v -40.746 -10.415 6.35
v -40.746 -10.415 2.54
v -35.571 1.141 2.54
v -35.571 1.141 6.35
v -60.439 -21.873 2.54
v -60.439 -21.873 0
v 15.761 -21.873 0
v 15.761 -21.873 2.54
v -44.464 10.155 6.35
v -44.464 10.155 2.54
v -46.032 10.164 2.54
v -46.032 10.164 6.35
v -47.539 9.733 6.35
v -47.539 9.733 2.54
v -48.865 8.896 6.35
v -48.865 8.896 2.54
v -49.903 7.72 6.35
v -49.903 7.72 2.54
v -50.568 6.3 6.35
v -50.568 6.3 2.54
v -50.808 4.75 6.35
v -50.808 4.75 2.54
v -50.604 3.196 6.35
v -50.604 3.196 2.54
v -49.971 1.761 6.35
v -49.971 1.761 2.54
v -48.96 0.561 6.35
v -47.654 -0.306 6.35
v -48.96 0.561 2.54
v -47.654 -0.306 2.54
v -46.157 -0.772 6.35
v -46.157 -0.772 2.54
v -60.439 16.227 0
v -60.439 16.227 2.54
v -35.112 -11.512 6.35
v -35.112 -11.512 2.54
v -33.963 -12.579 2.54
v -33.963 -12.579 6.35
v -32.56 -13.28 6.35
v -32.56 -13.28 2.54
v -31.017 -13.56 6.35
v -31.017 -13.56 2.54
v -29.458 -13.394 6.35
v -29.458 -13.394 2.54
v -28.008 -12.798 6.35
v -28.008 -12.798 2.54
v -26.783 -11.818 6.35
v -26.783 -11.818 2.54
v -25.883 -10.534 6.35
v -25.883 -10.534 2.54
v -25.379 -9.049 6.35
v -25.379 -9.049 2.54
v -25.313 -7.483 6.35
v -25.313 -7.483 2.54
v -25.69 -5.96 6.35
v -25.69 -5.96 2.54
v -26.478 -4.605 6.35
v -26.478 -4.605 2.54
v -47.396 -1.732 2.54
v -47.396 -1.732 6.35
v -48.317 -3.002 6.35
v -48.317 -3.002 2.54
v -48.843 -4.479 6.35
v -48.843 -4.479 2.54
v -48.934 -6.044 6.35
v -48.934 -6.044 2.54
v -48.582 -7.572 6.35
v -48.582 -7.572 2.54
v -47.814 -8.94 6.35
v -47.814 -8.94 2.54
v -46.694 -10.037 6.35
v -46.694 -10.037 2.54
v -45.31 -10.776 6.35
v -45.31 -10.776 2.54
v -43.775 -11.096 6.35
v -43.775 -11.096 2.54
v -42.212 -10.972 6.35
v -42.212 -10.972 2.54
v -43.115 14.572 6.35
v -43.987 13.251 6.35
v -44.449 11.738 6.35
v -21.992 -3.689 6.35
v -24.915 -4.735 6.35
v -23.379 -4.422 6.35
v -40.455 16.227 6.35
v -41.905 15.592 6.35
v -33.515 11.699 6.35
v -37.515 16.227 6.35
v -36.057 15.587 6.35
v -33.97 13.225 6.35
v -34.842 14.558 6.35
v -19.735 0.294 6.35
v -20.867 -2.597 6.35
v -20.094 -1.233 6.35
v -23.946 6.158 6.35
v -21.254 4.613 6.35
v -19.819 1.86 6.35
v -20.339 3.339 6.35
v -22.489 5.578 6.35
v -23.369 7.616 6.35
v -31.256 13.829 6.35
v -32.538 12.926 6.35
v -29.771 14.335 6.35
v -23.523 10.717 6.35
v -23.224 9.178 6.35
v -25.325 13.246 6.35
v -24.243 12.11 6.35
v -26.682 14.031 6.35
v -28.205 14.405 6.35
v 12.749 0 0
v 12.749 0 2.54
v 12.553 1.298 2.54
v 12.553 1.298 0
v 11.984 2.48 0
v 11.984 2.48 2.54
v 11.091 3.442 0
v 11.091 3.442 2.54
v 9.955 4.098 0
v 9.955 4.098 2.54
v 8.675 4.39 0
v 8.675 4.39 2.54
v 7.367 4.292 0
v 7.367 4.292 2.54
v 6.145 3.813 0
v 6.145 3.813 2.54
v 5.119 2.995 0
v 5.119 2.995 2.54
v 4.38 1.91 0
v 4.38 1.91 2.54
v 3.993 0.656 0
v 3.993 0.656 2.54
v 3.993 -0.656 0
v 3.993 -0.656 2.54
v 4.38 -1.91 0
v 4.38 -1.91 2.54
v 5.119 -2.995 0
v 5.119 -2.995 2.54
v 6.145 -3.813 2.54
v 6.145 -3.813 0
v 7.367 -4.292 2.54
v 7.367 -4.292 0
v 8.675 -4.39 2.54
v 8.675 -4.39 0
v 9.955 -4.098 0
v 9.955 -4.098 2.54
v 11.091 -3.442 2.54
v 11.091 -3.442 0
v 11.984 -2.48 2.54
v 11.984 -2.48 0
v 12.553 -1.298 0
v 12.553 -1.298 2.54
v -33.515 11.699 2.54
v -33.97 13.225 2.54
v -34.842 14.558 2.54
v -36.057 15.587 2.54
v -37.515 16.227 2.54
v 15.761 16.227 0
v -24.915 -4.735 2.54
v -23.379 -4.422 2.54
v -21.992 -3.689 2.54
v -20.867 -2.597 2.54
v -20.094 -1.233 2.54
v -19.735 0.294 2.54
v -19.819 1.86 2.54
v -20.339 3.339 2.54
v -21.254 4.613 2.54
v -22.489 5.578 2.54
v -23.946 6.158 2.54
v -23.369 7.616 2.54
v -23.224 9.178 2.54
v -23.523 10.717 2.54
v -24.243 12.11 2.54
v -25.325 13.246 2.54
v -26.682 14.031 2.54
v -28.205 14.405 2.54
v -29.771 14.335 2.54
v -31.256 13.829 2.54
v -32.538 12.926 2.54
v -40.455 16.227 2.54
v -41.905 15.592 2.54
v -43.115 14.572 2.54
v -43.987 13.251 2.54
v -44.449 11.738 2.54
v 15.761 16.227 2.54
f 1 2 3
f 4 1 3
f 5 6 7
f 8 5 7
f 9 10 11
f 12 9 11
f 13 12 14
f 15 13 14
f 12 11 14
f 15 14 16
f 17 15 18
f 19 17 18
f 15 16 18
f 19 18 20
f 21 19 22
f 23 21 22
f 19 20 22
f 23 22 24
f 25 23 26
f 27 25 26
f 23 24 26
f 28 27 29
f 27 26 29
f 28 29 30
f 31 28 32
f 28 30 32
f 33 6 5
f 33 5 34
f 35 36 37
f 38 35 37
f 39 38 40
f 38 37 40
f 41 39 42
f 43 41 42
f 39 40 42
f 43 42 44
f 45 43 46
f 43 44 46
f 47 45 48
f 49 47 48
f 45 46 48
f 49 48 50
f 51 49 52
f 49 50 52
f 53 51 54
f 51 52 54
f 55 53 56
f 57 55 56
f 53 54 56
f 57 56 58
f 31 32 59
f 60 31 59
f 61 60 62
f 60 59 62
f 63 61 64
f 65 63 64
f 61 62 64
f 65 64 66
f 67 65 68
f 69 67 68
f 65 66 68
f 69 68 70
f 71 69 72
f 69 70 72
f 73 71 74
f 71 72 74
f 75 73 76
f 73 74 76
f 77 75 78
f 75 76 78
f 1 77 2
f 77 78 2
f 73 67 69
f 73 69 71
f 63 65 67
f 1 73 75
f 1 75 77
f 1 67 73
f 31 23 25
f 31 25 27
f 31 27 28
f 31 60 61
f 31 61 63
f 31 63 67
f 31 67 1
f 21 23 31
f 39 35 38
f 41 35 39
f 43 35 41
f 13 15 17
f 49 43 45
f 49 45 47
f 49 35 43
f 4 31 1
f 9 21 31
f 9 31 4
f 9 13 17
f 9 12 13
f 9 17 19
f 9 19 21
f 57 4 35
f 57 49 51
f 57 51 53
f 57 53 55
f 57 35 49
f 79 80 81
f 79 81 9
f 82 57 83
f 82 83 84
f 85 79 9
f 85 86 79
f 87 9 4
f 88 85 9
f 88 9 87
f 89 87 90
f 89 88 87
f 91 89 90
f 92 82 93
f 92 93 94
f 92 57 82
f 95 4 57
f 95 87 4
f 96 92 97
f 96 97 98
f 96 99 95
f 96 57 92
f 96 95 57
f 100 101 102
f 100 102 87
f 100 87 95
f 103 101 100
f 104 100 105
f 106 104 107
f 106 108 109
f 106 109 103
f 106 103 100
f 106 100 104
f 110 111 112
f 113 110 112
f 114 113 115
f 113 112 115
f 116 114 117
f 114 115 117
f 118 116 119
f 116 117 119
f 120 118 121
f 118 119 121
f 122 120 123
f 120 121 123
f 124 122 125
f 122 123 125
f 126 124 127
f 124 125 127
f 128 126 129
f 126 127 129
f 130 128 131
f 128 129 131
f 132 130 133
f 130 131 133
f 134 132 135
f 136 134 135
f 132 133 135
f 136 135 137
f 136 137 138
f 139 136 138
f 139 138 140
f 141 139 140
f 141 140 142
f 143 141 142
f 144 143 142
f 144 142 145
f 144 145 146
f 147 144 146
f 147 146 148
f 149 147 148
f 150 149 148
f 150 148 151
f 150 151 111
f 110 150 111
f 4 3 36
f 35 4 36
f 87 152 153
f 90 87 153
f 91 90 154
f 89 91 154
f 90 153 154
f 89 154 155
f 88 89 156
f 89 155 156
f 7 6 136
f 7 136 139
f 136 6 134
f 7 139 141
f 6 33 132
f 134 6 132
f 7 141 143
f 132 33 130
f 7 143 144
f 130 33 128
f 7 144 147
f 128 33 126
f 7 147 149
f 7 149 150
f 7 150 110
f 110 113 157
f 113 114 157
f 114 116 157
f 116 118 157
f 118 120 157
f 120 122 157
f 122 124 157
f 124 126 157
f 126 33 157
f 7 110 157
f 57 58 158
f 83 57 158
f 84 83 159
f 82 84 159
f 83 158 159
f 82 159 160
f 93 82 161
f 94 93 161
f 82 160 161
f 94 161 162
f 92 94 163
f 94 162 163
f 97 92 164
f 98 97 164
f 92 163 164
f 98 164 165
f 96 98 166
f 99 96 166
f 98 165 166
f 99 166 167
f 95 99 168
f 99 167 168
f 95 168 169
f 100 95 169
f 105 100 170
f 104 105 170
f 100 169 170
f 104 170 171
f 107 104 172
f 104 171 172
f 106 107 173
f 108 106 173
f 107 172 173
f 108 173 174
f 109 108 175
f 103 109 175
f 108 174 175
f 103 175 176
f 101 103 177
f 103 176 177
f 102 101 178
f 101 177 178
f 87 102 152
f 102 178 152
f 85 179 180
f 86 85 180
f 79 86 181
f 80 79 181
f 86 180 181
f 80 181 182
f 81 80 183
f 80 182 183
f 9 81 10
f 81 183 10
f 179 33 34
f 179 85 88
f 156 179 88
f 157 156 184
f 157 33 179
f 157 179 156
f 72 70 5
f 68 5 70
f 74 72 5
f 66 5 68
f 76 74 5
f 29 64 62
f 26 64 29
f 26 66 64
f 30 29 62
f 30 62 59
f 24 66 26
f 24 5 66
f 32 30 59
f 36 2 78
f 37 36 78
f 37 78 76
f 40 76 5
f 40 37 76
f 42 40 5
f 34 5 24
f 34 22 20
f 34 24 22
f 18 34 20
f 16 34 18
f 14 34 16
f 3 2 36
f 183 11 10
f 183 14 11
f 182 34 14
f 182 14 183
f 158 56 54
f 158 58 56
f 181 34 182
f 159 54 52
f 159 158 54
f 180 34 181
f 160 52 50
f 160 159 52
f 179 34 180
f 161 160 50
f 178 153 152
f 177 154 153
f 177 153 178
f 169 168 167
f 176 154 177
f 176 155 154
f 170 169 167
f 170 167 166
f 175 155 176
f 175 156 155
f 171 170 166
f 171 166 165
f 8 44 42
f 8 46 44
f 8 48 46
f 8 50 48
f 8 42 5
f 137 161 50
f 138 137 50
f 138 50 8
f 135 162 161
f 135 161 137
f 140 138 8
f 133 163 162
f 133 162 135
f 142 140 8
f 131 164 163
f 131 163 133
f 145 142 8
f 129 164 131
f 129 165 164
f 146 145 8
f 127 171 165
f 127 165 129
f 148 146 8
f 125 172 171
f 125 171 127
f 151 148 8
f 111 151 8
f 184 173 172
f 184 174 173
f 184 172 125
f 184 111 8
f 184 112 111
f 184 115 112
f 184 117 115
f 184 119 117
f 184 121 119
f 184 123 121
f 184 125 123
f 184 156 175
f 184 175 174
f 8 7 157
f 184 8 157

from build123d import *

# Parameters (mm, degrees)
F0_W     = 76.2
F0_H     = 38.1
F1_DEPTH = 2.54
F2_R     = 4.402581
F3_DEPTH = 21.082
F5_DEPTH = 3.81


with BuildPart() as f1:
    # F0 (on Top) → F1 (new body)
    with BuildSketch(Plane.XY):
        with Locations((-22.33921, -2.823238)):
            Rectangle(F0_W, F0_H)
    extrude(amount=F1_DEPTH)

    # F2 (on face) → F3 (cut)
    with BuildSketch(Plane.XY.offset(2.54)):
        with Locations((8.346367, 0)):
            Circle(F2_R)
    extrude(amount=-F3_DEPTH, mode=Mode.SUBTRACT)

    # F4 (on face) → F5 (join)
    with BuildSketch(Plane.XY.offset(2.54)):
        with BuildLine():
            Line((-33.514785, 11.699406), (-35.571453, 1.141185))
            Line((-35.571453, 1.141185), (-23.946188, 6.15845))
            ThreePointArc((-23.946188, 6.15845), (-25.975231, 13.68694), (-33.514785, 11.699406))
        make_face()
        with BuildLine():
            Line((-35.571453, 1.141185), (-26.47813, -4.604892))
            ThreePointArc((-26.47813, -4.604892), (-19.860057, -0.482237), (-23.946188, 6.15845))
            Line((-23.946188, 6.15845), (-35.571453, 1.141185))
        make_face()
        with BuildLine():
            Line((-35.571453, 1.141185), (-35.112303, -11.512231))
            ThreePointArc((-35.112303, -11.512231), (-27.360523, -12.351928), (-26.47813, -4.604892))
            Line((-26.47813, -4.604892), (-35.571453, 1.141185))
        make_face()
        with BuildLine():
            Line((-40.746415, -10.414745), (-35.571453, 1.141185))
            Line((-35.571453, 1.141185), (-46.156678, -0.771649))
            ThreePointArc((-46.156678, -0.771649), (-48.246604, -8.283465), (-40.746415, -10.414745))
        make_face()
        with BuildLine():
            Line((-46.156678, -0.771649), (-35.571453, 1.141185))
            Line((-35.571453, 1.141185), (-44.463545, 10.155088))
            ThreePointArc((-44.463545, 10.155088), (-50.743462, 5.533635), (-46.156678, -0.771649))
        make_face()
        with BuildLine():
            Line((-44.463545, 10.155088), (-35.571453, 1.141185))
            Line((-35.571453, 1.141185), (-33.514785, 11.699406))
            ThreePointArc((-33.514785, 11.699406), (-34.841828, 14.557803), (-37.515037, 16.226762))
            Line((-37.515037, 16.226762), (-40.454786, 16.226762))
            ThreePointArc((-40.454786, 16.226762), (-43.598668, 13.94327), (-44.463545, 10.155088))
        make_face()
    extrude(amount=F5_DEPTH)


solid = f1.part
